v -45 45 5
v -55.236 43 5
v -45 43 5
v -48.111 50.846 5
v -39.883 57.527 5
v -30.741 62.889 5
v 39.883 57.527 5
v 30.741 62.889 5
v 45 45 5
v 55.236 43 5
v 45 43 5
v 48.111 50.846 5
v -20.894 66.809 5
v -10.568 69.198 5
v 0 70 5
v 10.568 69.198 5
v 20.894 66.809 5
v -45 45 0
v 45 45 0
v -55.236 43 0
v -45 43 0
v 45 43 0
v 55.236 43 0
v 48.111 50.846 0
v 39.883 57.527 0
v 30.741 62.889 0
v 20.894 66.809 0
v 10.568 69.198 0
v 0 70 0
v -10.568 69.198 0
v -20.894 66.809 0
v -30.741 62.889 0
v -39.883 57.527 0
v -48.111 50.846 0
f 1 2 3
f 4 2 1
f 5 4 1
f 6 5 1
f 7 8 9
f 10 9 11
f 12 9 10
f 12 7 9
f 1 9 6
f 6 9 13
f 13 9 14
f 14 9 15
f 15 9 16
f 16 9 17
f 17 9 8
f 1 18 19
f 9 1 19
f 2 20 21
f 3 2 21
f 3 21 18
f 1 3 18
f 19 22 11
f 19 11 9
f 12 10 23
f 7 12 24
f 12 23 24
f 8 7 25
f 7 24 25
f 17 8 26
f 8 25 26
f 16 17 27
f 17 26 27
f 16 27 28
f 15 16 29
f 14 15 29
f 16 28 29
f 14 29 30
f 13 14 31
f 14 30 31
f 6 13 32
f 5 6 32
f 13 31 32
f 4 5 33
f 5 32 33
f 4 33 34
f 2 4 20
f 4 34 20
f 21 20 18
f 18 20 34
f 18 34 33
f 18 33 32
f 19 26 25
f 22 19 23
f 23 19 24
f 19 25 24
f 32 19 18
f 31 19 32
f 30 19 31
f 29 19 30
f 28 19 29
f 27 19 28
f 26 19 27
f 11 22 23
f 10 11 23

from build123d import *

# Parameters (mm, degrees)
ESQUISSE1_R             = 175
ESQUISSE1_W             = 90
ESQUISSE1_H             = 90
BOSS_EXTRU_1_DEPTH      = 5
ENL_V_START             = -10
ENL_V_MAT_EXTRU_1_DEPTH = 10
ENL_V_MAT_EXTRU_4_DEPTH = 10


with BuildPart() as part:
    # Esquisse1 → Boss.-Extru.1 (new body)
    with BuildSketch(Plane.XY):
        Circle(ESQUISSE1_R)
        Rectangle(ESQUISSE1_W, ESQUISSE1_H, mode=Mode.SUBTRACT)
    extrude(amount=BOSS_EXTRU_1_DEPTH)

    # Esquisse2 → Enlèv. mat.-Extru.1 (cut)
    with BuildSketch(Plane.XY.offset(5).offset(ENL_V_START)):
        with BuildLine():
            Line((-156.468184794, 78.375424383), (-90, 40))
            Line((-90, 40), (-90, -40))
            Line((-90, -40), (-156.468184794, -78.375424383))
            ThreePointArc((-156.468184794, -78.375424383), (-175, 0), (-156.468184794, 78.375424383))
        make_face()
    extrude(amount=ENL_V_MAT_EXTRU_1_DEPTH, mode=Mode.SUBTRACT)

    # Esquisse3 → Enlèv. mat.-Extru.4 (cut)
    with BuildSketch(Plane.XY.offset(5).offset(ENL_V_START)):
        with BuildLine():
            Line((-156.468184794, 78.375424383), (-95.196152423, 43))
            Line((-95.196152423, 43), (-200, 43))
            Line((-200, 43), (-200, -207))
            Line((-200, -207), (200, -207))
            Line((200, -207), (200, 43))
            Line((200, 43), (169.634902069, 43))
            ThreePointArc((169.634902069, 43), (18.873149539, 173.979321261), (-156.468184794, 78.375424383))
        make_face()
        with BuildLine():
            Line((-55.235857919, 43), (55.235857919, 43))
            ThreePointArc((55.235857919, 43), (0, 70), (-55.235857919, 43))
        make_face(mode=Mode.SUBTRACT)
    extrude(amount=ENL_V_MAT_EXTRU_4_DEPTH, mode=Mode.SUBTRACT)


solid = part.part
